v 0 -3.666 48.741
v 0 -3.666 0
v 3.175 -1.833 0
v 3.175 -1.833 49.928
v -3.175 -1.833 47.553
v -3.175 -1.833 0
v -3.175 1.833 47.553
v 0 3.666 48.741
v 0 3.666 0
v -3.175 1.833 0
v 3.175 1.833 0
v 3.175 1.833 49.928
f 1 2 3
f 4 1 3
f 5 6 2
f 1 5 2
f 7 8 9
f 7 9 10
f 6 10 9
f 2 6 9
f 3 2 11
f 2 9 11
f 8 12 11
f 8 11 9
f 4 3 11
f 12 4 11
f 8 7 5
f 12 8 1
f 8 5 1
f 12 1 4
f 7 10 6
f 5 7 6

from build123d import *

# Parameters (mm, degrees)
F1_DEPTH = 50.8
F3_DEPTH = 12.7


with BuildPart() as f1:
    # F0 (on Top) → F1 (new body)
    with BuildSketch(Plane.XY):
        Polygon((0, 3.666174), (-3.175, 1.833087), (-3.175, -1.833087), (0, -3.666174), (3.175, -1.833087), (3.175, 1.833087), align=None)
    extrude(amount=F1_DEPTH)

    # F2 (on Front) → F3 (cut, symmetric)
    with BuildSketch(Plane.XZ):
        Polygon((-6.354235, 54.107219), (-6.183569, 46.427269), (5.677683, 50.864574), (5.677683, 54.107219), align=None)
    extrude(amount=F3_DEPTH, both=True, mode=Mode.SUBTRACT)


solid = f1.part
